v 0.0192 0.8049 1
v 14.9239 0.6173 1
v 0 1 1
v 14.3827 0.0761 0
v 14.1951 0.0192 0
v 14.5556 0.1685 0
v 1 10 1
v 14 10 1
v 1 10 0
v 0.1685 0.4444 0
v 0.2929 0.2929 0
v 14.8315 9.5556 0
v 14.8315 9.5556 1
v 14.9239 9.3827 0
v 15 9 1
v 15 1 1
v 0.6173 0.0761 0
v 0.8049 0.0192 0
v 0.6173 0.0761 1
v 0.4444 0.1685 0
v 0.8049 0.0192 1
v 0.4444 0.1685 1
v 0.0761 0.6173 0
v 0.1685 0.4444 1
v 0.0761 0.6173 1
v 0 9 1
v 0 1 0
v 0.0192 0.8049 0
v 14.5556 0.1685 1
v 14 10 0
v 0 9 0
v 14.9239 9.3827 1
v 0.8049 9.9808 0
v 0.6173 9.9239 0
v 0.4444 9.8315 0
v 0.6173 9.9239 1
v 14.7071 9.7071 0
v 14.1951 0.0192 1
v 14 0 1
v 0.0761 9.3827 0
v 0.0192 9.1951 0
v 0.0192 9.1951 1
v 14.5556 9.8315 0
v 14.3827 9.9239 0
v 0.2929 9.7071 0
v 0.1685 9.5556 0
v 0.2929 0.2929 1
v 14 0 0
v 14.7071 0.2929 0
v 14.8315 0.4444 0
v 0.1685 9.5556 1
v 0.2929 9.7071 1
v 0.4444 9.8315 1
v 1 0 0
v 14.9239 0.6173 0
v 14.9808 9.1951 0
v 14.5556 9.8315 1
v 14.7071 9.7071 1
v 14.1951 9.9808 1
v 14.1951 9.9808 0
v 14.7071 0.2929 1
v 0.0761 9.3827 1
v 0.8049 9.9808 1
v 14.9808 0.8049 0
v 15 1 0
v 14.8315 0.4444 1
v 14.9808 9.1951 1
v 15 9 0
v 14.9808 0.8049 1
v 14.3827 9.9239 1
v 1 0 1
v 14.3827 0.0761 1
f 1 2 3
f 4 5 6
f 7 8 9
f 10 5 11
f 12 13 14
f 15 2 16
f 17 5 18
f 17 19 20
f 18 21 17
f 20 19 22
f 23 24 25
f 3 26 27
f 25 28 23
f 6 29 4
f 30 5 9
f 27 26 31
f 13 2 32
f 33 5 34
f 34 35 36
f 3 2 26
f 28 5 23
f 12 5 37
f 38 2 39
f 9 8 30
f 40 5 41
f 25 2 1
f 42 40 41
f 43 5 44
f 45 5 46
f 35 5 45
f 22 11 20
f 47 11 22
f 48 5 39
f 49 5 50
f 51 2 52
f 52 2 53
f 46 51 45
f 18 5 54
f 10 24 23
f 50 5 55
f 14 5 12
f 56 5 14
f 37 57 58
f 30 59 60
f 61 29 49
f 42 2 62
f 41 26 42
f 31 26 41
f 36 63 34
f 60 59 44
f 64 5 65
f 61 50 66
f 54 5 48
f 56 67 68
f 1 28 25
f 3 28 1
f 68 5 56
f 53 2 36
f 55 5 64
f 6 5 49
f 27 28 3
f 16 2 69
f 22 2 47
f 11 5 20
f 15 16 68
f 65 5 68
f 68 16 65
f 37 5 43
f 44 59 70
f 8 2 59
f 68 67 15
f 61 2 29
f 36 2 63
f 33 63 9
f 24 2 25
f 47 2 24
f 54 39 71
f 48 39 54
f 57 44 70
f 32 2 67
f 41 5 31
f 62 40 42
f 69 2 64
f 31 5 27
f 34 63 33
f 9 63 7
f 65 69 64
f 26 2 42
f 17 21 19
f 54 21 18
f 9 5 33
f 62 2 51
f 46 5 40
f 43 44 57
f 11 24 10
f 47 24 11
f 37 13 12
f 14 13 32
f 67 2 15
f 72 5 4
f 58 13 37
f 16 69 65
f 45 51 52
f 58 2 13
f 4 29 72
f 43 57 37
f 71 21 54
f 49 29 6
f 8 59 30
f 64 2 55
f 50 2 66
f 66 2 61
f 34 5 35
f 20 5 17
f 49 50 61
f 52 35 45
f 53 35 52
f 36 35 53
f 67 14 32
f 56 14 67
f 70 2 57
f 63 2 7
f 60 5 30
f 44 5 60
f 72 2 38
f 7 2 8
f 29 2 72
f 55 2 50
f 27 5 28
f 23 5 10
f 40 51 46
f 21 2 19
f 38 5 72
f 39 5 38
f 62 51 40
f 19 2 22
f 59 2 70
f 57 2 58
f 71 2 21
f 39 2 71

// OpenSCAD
//Rounded plate module - faster than minkowski!
//variables with "customizer" in them are only for the Thingiverse customizer and are not essential.


customizer_x=15;
customizer_y=10;
customizer_z=1;

customizer_facets=32;
customizer_rounding_radius=1;

module rounded_plate(size_x,size_y,size_z,facets,rounding_radius)
{
	hull()
	{
		translate([rounding_radius,rounding_radius,0]) cylinder (h=size_z, r=rounding_radius,$fn=facets);
		translate([size_x-rounding_radius,rounding_radius,0]) cylinder (h=size_z,r=rounding_radius,$fn=facets);
		translate([rounding_radius,size_y-rounding_radius,0]) cylinder (h=size_z,r=rounding_radius,$fn=facets);
		translate([size_x-rounding_radius,size_y-rounding_radius,0]) cylinder (h=size_z,r=rounding_radius,$fn=facets);
	}
}

rounded_plate(customizer_x,customizer_y,customizer_z,customizer_facets,customizer_rounding_radius);
